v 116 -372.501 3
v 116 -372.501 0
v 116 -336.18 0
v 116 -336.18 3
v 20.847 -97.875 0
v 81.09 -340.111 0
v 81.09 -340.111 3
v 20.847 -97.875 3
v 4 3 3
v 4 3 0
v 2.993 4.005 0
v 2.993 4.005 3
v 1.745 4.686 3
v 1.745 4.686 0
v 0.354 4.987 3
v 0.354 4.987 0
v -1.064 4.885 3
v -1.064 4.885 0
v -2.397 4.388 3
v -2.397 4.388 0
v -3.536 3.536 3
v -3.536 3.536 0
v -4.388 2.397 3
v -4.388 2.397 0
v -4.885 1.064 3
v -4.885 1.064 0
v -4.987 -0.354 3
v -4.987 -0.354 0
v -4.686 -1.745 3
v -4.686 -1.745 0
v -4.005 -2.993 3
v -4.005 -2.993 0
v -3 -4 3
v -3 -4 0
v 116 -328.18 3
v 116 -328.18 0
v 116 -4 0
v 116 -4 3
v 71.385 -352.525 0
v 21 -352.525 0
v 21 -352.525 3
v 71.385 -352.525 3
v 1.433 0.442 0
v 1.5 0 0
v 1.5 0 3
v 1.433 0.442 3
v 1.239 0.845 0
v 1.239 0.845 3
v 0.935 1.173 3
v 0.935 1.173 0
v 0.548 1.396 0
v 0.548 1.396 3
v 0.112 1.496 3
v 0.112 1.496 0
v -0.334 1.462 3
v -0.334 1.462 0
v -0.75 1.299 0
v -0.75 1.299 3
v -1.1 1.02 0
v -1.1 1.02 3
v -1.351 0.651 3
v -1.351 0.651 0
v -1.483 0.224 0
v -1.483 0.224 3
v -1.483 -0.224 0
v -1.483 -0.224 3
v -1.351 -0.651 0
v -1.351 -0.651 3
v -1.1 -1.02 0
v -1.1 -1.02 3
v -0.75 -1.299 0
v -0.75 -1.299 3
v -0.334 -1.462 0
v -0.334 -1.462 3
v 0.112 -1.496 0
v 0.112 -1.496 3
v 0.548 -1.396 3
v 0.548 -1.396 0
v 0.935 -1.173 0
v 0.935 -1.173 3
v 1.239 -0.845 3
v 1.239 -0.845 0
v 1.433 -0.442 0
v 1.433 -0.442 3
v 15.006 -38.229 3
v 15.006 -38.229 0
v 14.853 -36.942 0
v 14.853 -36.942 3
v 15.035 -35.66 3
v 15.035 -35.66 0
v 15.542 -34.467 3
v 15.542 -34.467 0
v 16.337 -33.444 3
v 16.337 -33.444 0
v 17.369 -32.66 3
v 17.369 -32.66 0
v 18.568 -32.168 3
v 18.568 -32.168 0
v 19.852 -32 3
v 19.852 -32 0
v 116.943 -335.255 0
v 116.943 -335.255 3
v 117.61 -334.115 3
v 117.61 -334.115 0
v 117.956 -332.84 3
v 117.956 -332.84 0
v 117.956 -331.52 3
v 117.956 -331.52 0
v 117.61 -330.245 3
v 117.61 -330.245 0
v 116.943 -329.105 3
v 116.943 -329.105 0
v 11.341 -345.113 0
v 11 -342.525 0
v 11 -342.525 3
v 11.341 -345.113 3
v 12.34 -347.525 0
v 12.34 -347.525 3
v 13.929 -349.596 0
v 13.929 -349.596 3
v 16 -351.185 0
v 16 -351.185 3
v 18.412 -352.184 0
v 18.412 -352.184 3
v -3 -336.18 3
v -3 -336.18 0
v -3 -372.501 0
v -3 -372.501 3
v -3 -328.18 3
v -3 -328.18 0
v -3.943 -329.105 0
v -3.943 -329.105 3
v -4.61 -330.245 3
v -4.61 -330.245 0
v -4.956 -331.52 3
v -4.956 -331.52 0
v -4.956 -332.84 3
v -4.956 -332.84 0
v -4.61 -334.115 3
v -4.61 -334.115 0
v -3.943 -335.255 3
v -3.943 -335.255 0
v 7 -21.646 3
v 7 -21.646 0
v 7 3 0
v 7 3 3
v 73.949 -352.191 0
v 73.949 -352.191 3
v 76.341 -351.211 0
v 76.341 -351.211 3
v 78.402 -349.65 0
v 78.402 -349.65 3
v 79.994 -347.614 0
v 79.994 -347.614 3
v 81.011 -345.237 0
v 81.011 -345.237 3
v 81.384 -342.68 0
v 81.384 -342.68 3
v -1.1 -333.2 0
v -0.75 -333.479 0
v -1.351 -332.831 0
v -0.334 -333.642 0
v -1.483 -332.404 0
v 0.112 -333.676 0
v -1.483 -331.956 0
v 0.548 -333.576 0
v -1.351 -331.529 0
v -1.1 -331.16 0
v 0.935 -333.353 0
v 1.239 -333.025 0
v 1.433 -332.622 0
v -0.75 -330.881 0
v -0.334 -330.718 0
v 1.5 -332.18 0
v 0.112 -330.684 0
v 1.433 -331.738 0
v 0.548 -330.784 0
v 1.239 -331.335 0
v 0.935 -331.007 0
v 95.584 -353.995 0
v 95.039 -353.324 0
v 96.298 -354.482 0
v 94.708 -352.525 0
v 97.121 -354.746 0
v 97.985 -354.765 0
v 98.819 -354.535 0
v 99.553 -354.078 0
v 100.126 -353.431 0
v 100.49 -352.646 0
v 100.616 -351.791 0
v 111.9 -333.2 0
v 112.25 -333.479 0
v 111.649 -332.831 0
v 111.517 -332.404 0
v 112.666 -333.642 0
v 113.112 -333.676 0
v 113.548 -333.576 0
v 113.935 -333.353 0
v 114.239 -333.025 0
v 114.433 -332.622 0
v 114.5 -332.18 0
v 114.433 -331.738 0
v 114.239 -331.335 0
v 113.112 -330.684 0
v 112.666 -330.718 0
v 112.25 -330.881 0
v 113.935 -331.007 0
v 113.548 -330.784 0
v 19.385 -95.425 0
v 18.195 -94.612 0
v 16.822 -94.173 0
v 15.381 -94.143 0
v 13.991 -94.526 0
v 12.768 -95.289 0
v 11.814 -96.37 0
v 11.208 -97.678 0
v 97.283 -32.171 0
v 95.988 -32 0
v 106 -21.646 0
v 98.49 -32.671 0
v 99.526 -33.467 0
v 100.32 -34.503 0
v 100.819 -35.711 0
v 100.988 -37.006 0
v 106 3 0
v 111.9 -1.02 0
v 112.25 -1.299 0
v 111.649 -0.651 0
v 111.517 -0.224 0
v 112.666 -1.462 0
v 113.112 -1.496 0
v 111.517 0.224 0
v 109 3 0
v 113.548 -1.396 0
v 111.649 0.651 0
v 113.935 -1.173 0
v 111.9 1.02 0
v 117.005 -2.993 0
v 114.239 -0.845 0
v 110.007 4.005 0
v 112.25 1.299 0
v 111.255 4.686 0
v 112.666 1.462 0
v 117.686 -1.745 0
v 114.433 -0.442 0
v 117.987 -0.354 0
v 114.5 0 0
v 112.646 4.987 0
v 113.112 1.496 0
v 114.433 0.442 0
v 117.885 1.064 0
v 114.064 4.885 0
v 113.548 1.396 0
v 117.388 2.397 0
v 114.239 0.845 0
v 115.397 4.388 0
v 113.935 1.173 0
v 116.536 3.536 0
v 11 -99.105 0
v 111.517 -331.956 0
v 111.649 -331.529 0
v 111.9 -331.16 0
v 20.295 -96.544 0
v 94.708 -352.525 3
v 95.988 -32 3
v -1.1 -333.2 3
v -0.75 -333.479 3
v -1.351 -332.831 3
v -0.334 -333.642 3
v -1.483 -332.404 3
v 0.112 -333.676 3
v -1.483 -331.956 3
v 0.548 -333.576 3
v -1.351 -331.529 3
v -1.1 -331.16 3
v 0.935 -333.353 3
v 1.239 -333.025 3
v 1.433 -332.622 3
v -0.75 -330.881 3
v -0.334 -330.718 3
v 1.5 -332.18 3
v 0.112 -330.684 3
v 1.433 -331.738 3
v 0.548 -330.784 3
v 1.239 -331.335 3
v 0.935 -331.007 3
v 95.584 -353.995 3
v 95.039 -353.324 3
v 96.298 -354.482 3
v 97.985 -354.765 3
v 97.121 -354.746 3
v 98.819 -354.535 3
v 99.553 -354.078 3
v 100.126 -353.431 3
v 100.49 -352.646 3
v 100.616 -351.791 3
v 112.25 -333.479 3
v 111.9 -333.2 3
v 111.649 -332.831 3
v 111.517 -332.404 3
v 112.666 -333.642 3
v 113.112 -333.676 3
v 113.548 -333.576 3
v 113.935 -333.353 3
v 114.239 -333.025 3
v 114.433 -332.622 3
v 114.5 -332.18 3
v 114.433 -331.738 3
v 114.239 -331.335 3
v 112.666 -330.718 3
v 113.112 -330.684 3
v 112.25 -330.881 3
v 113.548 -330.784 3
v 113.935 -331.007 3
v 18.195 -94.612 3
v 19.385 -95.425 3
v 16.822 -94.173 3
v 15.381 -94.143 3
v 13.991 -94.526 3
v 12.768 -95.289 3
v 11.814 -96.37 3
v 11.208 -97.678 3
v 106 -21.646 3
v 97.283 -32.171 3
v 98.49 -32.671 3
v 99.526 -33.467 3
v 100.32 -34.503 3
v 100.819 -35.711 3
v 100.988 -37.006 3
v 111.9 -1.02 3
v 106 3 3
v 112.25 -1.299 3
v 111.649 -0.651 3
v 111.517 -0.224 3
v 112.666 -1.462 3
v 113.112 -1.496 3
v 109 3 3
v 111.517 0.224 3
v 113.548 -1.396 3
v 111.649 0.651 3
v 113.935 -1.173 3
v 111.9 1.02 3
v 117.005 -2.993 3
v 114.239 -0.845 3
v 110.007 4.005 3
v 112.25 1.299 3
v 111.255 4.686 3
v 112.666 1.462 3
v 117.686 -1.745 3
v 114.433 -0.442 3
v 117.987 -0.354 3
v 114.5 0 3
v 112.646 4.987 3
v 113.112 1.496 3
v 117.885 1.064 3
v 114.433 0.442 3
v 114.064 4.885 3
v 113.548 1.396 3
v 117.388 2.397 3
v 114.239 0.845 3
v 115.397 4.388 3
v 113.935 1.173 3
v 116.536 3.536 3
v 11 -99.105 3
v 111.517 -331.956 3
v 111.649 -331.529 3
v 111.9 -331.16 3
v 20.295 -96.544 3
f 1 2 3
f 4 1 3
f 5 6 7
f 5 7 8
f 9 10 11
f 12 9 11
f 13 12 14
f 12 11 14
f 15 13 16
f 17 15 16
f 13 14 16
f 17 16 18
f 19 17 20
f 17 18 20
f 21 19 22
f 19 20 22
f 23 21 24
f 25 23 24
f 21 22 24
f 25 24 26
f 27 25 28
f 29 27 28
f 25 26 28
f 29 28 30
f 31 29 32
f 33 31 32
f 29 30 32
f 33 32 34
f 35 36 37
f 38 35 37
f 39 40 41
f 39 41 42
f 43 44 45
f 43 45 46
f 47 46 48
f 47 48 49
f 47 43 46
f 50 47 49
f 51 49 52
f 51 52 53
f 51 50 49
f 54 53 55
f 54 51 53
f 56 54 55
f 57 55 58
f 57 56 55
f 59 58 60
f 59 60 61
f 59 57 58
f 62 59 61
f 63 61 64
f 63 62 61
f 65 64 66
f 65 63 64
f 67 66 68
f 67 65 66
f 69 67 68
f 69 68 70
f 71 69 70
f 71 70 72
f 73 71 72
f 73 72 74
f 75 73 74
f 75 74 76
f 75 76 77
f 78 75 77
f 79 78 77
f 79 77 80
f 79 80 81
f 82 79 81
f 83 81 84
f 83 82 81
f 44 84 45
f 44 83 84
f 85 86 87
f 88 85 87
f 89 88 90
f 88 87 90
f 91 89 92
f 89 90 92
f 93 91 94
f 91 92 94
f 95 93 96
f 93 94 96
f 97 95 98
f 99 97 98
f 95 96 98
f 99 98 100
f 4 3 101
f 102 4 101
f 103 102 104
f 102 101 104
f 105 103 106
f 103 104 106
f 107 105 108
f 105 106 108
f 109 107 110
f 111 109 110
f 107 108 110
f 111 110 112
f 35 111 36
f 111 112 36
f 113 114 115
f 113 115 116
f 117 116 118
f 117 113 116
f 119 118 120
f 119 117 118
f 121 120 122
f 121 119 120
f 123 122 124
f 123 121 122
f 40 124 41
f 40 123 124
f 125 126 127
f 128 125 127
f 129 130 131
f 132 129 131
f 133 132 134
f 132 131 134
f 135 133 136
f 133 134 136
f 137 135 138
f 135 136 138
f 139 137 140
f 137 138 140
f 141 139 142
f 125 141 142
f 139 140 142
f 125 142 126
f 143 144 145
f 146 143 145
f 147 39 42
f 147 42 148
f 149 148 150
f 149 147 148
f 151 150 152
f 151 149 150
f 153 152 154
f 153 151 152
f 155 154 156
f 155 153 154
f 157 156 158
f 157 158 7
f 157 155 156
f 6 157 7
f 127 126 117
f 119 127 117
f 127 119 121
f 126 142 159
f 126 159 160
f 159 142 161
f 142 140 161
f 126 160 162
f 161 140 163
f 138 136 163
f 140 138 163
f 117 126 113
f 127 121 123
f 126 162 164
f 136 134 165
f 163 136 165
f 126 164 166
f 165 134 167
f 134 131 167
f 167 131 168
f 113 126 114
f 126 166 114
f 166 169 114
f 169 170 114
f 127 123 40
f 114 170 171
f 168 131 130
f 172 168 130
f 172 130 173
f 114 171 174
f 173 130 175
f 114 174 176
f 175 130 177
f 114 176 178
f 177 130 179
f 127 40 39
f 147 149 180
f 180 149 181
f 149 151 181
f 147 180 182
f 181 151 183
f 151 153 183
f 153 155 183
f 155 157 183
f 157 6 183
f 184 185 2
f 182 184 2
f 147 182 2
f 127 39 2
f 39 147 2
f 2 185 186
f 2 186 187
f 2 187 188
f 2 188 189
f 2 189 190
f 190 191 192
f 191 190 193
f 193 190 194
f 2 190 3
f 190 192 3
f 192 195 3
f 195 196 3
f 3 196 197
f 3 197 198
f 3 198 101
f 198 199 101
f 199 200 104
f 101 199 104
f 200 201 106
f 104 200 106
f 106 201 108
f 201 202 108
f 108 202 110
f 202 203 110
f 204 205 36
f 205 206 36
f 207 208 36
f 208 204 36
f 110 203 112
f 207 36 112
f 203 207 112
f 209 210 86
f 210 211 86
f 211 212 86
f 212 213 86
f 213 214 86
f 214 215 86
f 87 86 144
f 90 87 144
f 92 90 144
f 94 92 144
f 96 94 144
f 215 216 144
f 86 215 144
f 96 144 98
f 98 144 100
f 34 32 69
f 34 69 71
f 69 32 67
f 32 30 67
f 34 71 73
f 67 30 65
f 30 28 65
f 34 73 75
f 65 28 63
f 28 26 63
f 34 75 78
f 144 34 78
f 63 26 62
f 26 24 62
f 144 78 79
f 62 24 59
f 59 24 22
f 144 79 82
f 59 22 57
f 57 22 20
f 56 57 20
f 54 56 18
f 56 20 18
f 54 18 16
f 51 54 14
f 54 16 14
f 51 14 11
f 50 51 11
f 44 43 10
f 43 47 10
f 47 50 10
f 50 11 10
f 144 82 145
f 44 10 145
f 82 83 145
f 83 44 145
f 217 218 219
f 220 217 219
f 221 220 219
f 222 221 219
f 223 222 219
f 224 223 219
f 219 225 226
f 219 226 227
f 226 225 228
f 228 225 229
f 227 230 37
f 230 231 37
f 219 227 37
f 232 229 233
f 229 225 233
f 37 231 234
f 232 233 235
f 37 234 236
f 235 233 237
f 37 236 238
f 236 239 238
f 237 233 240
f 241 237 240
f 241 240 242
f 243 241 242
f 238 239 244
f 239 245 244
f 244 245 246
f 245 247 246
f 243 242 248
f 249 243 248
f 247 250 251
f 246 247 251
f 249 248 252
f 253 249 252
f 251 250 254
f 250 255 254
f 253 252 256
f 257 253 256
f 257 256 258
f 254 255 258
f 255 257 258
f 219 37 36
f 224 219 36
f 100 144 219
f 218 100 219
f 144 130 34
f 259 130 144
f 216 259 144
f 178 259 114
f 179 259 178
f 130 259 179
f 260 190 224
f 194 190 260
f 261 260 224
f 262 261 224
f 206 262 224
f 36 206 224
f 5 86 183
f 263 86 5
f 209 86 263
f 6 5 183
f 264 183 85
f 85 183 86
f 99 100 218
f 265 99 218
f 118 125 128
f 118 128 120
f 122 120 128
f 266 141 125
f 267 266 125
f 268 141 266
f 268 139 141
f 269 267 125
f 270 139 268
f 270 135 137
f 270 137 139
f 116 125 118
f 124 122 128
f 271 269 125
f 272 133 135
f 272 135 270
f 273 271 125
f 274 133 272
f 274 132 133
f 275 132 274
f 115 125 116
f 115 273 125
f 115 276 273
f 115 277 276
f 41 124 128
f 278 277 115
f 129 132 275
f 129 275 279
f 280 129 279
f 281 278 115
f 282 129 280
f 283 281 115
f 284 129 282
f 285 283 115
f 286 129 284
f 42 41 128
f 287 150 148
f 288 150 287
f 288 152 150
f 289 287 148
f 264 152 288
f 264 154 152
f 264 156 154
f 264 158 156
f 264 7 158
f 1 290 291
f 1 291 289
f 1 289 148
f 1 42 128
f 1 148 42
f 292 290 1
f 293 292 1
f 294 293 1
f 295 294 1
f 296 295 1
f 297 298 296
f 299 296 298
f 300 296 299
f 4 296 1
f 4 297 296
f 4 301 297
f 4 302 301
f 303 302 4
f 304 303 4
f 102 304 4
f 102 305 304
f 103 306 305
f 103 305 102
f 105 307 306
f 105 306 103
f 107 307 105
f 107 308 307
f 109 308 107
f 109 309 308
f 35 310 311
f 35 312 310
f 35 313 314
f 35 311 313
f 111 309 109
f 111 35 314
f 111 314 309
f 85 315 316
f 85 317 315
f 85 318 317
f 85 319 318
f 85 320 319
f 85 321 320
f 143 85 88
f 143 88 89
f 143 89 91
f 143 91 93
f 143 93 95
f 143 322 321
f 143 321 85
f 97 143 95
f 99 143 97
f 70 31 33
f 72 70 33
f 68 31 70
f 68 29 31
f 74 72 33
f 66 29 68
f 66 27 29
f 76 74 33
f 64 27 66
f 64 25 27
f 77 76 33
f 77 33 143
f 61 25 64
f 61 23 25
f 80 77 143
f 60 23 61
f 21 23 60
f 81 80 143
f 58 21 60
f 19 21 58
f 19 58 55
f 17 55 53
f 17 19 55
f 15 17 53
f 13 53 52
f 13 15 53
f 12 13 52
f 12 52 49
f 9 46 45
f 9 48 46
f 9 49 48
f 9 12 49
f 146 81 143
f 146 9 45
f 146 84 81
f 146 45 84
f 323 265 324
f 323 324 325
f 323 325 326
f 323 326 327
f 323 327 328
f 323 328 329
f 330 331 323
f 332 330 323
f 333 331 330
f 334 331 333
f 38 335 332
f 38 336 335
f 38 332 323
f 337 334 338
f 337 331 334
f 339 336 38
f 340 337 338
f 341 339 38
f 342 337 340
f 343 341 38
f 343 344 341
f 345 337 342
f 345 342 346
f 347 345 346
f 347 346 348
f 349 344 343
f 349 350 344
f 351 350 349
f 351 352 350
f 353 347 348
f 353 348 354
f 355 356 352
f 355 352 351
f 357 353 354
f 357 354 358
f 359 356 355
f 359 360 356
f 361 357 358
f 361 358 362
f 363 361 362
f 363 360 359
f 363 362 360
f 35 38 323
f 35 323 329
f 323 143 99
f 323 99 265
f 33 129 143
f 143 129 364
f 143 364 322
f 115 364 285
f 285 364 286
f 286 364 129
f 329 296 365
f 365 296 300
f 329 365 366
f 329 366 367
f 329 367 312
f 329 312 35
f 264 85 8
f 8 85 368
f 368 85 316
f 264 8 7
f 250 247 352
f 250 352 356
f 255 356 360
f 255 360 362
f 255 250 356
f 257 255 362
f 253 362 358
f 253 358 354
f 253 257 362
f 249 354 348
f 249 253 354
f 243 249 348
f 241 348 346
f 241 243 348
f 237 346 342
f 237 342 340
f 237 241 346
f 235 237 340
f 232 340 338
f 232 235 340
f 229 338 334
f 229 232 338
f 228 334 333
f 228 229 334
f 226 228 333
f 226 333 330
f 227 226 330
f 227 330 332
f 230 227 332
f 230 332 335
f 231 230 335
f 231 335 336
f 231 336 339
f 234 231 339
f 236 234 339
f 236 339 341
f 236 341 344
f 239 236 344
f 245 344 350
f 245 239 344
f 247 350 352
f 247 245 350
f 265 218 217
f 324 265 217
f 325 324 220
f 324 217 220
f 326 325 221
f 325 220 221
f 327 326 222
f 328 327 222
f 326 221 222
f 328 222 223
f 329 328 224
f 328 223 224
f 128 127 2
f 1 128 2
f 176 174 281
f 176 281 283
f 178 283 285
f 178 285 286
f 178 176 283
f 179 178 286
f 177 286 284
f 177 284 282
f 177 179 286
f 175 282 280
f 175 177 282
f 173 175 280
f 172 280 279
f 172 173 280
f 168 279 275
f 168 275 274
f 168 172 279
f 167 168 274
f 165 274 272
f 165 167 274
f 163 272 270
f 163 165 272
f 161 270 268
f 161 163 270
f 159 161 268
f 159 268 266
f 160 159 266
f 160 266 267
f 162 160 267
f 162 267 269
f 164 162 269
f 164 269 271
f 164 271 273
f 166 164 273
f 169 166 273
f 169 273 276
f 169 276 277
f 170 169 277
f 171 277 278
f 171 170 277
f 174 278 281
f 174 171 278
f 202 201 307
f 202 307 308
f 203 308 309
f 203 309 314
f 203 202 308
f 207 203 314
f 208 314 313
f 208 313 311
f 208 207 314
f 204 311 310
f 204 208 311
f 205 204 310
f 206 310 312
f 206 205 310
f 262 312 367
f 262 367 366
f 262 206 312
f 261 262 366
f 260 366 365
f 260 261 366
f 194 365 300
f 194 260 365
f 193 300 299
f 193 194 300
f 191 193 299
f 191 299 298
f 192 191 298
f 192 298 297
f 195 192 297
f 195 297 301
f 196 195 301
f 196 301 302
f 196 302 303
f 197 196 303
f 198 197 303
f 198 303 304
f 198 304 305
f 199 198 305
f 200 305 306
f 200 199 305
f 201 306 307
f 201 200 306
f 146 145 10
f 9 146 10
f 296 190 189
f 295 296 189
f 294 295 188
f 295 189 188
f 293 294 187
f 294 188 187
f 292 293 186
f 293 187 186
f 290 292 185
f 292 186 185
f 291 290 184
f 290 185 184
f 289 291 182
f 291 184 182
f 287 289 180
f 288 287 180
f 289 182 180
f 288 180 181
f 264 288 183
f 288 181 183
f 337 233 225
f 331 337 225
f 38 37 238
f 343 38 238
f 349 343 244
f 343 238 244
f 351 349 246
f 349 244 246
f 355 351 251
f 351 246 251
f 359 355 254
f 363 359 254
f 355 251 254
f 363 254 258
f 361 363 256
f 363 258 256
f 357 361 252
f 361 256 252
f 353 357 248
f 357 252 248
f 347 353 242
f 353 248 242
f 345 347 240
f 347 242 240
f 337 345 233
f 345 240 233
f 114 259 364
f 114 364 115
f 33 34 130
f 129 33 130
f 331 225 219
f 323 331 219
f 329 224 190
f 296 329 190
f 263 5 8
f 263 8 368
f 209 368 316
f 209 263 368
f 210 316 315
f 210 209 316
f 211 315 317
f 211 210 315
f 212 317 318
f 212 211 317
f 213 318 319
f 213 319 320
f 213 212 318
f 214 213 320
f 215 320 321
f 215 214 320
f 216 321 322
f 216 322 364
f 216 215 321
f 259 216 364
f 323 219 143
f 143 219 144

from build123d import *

# Parameters (mm, degrees)
SKETCH_1_R      = 1.5
EXTRUDE_1_DEPTH = 3


with BuildPart() as part:
    # 草图1 → 凸台-拉伸1 (new body)
    with BuildSketch(Plane.XY):
        with BuildLine():
            Line((-3, -336.18), (-3, -372.501331749))
            Line((-3, -372.501331749), (116, -372.501331749))
            Line((116, -372.501331749), (116, -336.18))
            ThreePointArc((116, -336.18), (118, -332.18), (116, -328.18))
            Line((116, -328.18), (116, -4))
            ThreePointArc((116, -4), (116.535533906, 3.535533906), (109, 3))
            Line((109, 3), (106, 3))
            Line((106, 3), (106, -21.645755349))
            Line((106, -21.645755349), (7, -21.645755349))
            Line((7, -21.645755349), (7, 3))
            Line((7, 3), (4, 3))
            ThreePointArc((4, 3), (-3.535533906, 3.535533906), (-3, -4))
            Line((-3, -4), (-3, -328.18))
            ThreePointArc((-3, -328.18), (-5, -332.18), (-3, -336.18))
        make_face()
        Circle(SKETCH_1_R, mode=Mode.SUBTRACT)
        with Locations((113, 0)):
            Circle(SKETCH_1_R, mode=Mode.SUBTRACT)
        with Locations((0, -332.18)):
            Circle(SKETCH_1_R, mode=Mode.SUBTRACT)
        with Locations((113, -332.18)):
            Circle(SKETCH_1_R, mode=Mode.SUBTRACT)
        with BuildLine():
            Line((11, -99.104501604), (11, -342.524894505))
            ThreePointArc((11, -342.524894505), (13.928932188, -349.595962317), (21, -352.524894505))
            Line((21, -352.524894505), (71.385479273, -352.524894505))
            ThreePointArc((71.385479273, -352.524894505), (79.263756472, -348.683851265), (81.089872995, -340.111444179))
            Line((81.089872995, -340.111444179), (20.846592628, -97.875461369))
            ThreePointArc((20.846592628, -97.875461369), (15.380711351, -94.143001673), (11, -99.104501604))
        make_face(mode=Mode.SUBTRACT)
        with BuildLine():
            Line((100.988154046, -37.00591772), (100.615591755, -351.791020996))
            ThreePointArc((100.615591755, -351.791020996), (97.985405334, -354.764589688), (94.70763828, -352.524894505))
            Line((94.70763828, -352.524894505), (15.005818776, -38.229040236))
            ThreePointArc((15.005818776, -38.229040236), (15.906197954, -33.929592957), (19.852411404, -32))
            Line((19.852411404, -32), (95.988157548, -32))
            ThreePointArc((95.988157548, -32), (99.525783065, -33.466558944), (100.988154046, -37.00591772))
        make_face(mode=Mode.SUBTRACT)
    extrude(amount=EXTRUDE_1_DEPTH)


solid = part.part
